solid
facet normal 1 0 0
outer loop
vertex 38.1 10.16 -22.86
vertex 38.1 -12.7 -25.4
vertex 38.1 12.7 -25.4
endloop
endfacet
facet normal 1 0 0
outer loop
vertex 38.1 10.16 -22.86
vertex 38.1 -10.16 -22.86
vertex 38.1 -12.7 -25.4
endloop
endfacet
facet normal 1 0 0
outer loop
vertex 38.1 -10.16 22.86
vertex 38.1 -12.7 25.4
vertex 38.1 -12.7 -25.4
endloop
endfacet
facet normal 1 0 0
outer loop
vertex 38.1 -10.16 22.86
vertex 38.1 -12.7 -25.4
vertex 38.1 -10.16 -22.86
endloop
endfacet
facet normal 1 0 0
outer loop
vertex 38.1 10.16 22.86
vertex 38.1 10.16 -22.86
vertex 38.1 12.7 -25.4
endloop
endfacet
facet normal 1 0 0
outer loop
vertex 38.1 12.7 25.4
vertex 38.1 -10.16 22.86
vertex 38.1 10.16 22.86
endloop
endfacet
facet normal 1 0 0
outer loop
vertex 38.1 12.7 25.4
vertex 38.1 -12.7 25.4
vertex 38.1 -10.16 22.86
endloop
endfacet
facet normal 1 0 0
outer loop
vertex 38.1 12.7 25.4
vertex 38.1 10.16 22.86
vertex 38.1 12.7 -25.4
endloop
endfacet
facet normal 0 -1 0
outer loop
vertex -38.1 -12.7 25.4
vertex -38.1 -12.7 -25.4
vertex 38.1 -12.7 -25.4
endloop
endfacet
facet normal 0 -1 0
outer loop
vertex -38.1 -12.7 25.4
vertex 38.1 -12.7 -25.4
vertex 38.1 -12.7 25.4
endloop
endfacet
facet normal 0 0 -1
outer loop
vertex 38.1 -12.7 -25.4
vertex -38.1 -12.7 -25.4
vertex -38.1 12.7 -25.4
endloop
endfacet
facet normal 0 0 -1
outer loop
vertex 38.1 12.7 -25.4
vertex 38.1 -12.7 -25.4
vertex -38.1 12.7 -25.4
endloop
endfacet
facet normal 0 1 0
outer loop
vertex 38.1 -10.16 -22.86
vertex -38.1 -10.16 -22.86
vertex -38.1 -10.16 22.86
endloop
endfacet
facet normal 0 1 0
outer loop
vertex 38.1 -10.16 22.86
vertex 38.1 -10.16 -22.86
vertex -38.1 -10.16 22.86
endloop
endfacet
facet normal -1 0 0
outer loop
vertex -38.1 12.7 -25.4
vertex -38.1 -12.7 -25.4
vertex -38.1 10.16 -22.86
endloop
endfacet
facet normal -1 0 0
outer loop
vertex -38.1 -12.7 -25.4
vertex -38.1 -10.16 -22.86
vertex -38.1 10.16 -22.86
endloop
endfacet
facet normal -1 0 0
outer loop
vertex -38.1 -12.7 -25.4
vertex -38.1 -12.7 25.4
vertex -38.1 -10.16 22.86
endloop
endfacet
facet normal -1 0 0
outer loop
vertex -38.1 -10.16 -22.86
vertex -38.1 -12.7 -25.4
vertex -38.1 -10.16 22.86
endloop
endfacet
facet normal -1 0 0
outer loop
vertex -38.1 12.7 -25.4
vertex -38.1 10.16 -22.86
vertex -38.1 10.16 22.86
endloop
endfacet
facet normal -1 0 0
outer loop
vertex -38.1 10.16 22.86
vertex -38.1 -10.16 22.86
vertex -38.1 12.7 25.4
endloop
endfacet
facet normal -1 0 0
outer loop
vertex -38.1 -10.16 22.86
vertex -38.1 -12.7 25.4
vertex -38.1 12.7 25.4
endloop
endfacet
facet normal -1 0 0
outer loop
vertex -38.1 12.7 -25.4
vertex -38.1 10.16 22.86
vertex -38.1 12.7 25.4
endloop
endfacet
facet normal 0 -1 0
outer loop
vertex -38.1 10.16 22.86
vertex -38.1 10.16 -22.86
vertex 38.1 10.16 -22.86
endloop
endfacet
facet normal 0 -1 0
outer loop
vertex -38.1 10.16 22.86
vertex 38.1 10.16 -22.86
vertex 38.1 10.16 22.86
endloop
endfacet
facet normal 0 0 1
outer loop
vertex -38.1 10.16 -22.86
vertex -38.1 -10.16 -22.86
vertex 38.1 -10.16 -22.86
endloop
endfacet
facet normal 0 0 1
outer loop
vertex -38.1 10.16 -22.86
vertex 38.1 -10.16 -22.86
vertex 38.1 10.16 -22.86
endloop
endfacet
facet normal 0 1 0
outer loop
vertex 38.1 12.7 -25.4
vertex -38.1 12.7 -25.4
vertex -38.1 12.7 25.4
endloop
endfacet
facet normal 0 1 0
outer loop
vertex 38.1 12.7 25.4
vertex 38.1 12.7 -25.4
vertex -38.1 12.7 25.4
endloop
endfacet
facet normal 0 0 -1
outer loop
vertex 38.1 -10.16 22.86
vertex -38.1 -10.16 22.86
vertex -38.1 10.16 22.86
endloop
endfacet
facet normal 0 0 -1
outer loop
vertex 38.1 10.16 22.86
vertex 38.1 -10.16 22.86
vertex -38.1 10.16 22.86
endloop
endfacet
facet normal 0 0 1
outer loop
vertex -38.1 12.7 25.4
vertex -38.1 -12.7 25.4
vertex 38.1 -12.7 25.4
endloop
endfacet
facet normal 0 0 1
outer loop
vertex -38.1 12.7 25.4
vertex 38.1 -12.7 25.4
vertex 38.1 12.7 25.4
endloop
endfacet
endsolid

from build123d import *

# Parameters (mm, degrees)
SKETCH1_W                                 = 25.4
SKETCH1_H                                 = 50.8
SKETCH1_W_2                               = 20.32
SKETCH1_H_2                               = 45.72
VERSAFRAME_VERSAFRAME_2_X_1_X_0_1_1_DEPTH = 76.2


with BuildPart() as part:
    # Sketch1 → Versaframe VERSAFRAME 2 X 1 X 0.1 (1) (new body)
    with BuildSketch(Plane.YZ.offset(-38.1)):
        Rectangle(SKETCH1_W, SKETCH1_H)
        Rectangle(SKETCH1_W_2, SKETCH1_H_2, mode=Mode.SUBTRACT)
    extrude(amount=VERSAFRAME_VERSAFRAME_2_X_1_X_0_1_1_DEPTH)


solid = part.part
